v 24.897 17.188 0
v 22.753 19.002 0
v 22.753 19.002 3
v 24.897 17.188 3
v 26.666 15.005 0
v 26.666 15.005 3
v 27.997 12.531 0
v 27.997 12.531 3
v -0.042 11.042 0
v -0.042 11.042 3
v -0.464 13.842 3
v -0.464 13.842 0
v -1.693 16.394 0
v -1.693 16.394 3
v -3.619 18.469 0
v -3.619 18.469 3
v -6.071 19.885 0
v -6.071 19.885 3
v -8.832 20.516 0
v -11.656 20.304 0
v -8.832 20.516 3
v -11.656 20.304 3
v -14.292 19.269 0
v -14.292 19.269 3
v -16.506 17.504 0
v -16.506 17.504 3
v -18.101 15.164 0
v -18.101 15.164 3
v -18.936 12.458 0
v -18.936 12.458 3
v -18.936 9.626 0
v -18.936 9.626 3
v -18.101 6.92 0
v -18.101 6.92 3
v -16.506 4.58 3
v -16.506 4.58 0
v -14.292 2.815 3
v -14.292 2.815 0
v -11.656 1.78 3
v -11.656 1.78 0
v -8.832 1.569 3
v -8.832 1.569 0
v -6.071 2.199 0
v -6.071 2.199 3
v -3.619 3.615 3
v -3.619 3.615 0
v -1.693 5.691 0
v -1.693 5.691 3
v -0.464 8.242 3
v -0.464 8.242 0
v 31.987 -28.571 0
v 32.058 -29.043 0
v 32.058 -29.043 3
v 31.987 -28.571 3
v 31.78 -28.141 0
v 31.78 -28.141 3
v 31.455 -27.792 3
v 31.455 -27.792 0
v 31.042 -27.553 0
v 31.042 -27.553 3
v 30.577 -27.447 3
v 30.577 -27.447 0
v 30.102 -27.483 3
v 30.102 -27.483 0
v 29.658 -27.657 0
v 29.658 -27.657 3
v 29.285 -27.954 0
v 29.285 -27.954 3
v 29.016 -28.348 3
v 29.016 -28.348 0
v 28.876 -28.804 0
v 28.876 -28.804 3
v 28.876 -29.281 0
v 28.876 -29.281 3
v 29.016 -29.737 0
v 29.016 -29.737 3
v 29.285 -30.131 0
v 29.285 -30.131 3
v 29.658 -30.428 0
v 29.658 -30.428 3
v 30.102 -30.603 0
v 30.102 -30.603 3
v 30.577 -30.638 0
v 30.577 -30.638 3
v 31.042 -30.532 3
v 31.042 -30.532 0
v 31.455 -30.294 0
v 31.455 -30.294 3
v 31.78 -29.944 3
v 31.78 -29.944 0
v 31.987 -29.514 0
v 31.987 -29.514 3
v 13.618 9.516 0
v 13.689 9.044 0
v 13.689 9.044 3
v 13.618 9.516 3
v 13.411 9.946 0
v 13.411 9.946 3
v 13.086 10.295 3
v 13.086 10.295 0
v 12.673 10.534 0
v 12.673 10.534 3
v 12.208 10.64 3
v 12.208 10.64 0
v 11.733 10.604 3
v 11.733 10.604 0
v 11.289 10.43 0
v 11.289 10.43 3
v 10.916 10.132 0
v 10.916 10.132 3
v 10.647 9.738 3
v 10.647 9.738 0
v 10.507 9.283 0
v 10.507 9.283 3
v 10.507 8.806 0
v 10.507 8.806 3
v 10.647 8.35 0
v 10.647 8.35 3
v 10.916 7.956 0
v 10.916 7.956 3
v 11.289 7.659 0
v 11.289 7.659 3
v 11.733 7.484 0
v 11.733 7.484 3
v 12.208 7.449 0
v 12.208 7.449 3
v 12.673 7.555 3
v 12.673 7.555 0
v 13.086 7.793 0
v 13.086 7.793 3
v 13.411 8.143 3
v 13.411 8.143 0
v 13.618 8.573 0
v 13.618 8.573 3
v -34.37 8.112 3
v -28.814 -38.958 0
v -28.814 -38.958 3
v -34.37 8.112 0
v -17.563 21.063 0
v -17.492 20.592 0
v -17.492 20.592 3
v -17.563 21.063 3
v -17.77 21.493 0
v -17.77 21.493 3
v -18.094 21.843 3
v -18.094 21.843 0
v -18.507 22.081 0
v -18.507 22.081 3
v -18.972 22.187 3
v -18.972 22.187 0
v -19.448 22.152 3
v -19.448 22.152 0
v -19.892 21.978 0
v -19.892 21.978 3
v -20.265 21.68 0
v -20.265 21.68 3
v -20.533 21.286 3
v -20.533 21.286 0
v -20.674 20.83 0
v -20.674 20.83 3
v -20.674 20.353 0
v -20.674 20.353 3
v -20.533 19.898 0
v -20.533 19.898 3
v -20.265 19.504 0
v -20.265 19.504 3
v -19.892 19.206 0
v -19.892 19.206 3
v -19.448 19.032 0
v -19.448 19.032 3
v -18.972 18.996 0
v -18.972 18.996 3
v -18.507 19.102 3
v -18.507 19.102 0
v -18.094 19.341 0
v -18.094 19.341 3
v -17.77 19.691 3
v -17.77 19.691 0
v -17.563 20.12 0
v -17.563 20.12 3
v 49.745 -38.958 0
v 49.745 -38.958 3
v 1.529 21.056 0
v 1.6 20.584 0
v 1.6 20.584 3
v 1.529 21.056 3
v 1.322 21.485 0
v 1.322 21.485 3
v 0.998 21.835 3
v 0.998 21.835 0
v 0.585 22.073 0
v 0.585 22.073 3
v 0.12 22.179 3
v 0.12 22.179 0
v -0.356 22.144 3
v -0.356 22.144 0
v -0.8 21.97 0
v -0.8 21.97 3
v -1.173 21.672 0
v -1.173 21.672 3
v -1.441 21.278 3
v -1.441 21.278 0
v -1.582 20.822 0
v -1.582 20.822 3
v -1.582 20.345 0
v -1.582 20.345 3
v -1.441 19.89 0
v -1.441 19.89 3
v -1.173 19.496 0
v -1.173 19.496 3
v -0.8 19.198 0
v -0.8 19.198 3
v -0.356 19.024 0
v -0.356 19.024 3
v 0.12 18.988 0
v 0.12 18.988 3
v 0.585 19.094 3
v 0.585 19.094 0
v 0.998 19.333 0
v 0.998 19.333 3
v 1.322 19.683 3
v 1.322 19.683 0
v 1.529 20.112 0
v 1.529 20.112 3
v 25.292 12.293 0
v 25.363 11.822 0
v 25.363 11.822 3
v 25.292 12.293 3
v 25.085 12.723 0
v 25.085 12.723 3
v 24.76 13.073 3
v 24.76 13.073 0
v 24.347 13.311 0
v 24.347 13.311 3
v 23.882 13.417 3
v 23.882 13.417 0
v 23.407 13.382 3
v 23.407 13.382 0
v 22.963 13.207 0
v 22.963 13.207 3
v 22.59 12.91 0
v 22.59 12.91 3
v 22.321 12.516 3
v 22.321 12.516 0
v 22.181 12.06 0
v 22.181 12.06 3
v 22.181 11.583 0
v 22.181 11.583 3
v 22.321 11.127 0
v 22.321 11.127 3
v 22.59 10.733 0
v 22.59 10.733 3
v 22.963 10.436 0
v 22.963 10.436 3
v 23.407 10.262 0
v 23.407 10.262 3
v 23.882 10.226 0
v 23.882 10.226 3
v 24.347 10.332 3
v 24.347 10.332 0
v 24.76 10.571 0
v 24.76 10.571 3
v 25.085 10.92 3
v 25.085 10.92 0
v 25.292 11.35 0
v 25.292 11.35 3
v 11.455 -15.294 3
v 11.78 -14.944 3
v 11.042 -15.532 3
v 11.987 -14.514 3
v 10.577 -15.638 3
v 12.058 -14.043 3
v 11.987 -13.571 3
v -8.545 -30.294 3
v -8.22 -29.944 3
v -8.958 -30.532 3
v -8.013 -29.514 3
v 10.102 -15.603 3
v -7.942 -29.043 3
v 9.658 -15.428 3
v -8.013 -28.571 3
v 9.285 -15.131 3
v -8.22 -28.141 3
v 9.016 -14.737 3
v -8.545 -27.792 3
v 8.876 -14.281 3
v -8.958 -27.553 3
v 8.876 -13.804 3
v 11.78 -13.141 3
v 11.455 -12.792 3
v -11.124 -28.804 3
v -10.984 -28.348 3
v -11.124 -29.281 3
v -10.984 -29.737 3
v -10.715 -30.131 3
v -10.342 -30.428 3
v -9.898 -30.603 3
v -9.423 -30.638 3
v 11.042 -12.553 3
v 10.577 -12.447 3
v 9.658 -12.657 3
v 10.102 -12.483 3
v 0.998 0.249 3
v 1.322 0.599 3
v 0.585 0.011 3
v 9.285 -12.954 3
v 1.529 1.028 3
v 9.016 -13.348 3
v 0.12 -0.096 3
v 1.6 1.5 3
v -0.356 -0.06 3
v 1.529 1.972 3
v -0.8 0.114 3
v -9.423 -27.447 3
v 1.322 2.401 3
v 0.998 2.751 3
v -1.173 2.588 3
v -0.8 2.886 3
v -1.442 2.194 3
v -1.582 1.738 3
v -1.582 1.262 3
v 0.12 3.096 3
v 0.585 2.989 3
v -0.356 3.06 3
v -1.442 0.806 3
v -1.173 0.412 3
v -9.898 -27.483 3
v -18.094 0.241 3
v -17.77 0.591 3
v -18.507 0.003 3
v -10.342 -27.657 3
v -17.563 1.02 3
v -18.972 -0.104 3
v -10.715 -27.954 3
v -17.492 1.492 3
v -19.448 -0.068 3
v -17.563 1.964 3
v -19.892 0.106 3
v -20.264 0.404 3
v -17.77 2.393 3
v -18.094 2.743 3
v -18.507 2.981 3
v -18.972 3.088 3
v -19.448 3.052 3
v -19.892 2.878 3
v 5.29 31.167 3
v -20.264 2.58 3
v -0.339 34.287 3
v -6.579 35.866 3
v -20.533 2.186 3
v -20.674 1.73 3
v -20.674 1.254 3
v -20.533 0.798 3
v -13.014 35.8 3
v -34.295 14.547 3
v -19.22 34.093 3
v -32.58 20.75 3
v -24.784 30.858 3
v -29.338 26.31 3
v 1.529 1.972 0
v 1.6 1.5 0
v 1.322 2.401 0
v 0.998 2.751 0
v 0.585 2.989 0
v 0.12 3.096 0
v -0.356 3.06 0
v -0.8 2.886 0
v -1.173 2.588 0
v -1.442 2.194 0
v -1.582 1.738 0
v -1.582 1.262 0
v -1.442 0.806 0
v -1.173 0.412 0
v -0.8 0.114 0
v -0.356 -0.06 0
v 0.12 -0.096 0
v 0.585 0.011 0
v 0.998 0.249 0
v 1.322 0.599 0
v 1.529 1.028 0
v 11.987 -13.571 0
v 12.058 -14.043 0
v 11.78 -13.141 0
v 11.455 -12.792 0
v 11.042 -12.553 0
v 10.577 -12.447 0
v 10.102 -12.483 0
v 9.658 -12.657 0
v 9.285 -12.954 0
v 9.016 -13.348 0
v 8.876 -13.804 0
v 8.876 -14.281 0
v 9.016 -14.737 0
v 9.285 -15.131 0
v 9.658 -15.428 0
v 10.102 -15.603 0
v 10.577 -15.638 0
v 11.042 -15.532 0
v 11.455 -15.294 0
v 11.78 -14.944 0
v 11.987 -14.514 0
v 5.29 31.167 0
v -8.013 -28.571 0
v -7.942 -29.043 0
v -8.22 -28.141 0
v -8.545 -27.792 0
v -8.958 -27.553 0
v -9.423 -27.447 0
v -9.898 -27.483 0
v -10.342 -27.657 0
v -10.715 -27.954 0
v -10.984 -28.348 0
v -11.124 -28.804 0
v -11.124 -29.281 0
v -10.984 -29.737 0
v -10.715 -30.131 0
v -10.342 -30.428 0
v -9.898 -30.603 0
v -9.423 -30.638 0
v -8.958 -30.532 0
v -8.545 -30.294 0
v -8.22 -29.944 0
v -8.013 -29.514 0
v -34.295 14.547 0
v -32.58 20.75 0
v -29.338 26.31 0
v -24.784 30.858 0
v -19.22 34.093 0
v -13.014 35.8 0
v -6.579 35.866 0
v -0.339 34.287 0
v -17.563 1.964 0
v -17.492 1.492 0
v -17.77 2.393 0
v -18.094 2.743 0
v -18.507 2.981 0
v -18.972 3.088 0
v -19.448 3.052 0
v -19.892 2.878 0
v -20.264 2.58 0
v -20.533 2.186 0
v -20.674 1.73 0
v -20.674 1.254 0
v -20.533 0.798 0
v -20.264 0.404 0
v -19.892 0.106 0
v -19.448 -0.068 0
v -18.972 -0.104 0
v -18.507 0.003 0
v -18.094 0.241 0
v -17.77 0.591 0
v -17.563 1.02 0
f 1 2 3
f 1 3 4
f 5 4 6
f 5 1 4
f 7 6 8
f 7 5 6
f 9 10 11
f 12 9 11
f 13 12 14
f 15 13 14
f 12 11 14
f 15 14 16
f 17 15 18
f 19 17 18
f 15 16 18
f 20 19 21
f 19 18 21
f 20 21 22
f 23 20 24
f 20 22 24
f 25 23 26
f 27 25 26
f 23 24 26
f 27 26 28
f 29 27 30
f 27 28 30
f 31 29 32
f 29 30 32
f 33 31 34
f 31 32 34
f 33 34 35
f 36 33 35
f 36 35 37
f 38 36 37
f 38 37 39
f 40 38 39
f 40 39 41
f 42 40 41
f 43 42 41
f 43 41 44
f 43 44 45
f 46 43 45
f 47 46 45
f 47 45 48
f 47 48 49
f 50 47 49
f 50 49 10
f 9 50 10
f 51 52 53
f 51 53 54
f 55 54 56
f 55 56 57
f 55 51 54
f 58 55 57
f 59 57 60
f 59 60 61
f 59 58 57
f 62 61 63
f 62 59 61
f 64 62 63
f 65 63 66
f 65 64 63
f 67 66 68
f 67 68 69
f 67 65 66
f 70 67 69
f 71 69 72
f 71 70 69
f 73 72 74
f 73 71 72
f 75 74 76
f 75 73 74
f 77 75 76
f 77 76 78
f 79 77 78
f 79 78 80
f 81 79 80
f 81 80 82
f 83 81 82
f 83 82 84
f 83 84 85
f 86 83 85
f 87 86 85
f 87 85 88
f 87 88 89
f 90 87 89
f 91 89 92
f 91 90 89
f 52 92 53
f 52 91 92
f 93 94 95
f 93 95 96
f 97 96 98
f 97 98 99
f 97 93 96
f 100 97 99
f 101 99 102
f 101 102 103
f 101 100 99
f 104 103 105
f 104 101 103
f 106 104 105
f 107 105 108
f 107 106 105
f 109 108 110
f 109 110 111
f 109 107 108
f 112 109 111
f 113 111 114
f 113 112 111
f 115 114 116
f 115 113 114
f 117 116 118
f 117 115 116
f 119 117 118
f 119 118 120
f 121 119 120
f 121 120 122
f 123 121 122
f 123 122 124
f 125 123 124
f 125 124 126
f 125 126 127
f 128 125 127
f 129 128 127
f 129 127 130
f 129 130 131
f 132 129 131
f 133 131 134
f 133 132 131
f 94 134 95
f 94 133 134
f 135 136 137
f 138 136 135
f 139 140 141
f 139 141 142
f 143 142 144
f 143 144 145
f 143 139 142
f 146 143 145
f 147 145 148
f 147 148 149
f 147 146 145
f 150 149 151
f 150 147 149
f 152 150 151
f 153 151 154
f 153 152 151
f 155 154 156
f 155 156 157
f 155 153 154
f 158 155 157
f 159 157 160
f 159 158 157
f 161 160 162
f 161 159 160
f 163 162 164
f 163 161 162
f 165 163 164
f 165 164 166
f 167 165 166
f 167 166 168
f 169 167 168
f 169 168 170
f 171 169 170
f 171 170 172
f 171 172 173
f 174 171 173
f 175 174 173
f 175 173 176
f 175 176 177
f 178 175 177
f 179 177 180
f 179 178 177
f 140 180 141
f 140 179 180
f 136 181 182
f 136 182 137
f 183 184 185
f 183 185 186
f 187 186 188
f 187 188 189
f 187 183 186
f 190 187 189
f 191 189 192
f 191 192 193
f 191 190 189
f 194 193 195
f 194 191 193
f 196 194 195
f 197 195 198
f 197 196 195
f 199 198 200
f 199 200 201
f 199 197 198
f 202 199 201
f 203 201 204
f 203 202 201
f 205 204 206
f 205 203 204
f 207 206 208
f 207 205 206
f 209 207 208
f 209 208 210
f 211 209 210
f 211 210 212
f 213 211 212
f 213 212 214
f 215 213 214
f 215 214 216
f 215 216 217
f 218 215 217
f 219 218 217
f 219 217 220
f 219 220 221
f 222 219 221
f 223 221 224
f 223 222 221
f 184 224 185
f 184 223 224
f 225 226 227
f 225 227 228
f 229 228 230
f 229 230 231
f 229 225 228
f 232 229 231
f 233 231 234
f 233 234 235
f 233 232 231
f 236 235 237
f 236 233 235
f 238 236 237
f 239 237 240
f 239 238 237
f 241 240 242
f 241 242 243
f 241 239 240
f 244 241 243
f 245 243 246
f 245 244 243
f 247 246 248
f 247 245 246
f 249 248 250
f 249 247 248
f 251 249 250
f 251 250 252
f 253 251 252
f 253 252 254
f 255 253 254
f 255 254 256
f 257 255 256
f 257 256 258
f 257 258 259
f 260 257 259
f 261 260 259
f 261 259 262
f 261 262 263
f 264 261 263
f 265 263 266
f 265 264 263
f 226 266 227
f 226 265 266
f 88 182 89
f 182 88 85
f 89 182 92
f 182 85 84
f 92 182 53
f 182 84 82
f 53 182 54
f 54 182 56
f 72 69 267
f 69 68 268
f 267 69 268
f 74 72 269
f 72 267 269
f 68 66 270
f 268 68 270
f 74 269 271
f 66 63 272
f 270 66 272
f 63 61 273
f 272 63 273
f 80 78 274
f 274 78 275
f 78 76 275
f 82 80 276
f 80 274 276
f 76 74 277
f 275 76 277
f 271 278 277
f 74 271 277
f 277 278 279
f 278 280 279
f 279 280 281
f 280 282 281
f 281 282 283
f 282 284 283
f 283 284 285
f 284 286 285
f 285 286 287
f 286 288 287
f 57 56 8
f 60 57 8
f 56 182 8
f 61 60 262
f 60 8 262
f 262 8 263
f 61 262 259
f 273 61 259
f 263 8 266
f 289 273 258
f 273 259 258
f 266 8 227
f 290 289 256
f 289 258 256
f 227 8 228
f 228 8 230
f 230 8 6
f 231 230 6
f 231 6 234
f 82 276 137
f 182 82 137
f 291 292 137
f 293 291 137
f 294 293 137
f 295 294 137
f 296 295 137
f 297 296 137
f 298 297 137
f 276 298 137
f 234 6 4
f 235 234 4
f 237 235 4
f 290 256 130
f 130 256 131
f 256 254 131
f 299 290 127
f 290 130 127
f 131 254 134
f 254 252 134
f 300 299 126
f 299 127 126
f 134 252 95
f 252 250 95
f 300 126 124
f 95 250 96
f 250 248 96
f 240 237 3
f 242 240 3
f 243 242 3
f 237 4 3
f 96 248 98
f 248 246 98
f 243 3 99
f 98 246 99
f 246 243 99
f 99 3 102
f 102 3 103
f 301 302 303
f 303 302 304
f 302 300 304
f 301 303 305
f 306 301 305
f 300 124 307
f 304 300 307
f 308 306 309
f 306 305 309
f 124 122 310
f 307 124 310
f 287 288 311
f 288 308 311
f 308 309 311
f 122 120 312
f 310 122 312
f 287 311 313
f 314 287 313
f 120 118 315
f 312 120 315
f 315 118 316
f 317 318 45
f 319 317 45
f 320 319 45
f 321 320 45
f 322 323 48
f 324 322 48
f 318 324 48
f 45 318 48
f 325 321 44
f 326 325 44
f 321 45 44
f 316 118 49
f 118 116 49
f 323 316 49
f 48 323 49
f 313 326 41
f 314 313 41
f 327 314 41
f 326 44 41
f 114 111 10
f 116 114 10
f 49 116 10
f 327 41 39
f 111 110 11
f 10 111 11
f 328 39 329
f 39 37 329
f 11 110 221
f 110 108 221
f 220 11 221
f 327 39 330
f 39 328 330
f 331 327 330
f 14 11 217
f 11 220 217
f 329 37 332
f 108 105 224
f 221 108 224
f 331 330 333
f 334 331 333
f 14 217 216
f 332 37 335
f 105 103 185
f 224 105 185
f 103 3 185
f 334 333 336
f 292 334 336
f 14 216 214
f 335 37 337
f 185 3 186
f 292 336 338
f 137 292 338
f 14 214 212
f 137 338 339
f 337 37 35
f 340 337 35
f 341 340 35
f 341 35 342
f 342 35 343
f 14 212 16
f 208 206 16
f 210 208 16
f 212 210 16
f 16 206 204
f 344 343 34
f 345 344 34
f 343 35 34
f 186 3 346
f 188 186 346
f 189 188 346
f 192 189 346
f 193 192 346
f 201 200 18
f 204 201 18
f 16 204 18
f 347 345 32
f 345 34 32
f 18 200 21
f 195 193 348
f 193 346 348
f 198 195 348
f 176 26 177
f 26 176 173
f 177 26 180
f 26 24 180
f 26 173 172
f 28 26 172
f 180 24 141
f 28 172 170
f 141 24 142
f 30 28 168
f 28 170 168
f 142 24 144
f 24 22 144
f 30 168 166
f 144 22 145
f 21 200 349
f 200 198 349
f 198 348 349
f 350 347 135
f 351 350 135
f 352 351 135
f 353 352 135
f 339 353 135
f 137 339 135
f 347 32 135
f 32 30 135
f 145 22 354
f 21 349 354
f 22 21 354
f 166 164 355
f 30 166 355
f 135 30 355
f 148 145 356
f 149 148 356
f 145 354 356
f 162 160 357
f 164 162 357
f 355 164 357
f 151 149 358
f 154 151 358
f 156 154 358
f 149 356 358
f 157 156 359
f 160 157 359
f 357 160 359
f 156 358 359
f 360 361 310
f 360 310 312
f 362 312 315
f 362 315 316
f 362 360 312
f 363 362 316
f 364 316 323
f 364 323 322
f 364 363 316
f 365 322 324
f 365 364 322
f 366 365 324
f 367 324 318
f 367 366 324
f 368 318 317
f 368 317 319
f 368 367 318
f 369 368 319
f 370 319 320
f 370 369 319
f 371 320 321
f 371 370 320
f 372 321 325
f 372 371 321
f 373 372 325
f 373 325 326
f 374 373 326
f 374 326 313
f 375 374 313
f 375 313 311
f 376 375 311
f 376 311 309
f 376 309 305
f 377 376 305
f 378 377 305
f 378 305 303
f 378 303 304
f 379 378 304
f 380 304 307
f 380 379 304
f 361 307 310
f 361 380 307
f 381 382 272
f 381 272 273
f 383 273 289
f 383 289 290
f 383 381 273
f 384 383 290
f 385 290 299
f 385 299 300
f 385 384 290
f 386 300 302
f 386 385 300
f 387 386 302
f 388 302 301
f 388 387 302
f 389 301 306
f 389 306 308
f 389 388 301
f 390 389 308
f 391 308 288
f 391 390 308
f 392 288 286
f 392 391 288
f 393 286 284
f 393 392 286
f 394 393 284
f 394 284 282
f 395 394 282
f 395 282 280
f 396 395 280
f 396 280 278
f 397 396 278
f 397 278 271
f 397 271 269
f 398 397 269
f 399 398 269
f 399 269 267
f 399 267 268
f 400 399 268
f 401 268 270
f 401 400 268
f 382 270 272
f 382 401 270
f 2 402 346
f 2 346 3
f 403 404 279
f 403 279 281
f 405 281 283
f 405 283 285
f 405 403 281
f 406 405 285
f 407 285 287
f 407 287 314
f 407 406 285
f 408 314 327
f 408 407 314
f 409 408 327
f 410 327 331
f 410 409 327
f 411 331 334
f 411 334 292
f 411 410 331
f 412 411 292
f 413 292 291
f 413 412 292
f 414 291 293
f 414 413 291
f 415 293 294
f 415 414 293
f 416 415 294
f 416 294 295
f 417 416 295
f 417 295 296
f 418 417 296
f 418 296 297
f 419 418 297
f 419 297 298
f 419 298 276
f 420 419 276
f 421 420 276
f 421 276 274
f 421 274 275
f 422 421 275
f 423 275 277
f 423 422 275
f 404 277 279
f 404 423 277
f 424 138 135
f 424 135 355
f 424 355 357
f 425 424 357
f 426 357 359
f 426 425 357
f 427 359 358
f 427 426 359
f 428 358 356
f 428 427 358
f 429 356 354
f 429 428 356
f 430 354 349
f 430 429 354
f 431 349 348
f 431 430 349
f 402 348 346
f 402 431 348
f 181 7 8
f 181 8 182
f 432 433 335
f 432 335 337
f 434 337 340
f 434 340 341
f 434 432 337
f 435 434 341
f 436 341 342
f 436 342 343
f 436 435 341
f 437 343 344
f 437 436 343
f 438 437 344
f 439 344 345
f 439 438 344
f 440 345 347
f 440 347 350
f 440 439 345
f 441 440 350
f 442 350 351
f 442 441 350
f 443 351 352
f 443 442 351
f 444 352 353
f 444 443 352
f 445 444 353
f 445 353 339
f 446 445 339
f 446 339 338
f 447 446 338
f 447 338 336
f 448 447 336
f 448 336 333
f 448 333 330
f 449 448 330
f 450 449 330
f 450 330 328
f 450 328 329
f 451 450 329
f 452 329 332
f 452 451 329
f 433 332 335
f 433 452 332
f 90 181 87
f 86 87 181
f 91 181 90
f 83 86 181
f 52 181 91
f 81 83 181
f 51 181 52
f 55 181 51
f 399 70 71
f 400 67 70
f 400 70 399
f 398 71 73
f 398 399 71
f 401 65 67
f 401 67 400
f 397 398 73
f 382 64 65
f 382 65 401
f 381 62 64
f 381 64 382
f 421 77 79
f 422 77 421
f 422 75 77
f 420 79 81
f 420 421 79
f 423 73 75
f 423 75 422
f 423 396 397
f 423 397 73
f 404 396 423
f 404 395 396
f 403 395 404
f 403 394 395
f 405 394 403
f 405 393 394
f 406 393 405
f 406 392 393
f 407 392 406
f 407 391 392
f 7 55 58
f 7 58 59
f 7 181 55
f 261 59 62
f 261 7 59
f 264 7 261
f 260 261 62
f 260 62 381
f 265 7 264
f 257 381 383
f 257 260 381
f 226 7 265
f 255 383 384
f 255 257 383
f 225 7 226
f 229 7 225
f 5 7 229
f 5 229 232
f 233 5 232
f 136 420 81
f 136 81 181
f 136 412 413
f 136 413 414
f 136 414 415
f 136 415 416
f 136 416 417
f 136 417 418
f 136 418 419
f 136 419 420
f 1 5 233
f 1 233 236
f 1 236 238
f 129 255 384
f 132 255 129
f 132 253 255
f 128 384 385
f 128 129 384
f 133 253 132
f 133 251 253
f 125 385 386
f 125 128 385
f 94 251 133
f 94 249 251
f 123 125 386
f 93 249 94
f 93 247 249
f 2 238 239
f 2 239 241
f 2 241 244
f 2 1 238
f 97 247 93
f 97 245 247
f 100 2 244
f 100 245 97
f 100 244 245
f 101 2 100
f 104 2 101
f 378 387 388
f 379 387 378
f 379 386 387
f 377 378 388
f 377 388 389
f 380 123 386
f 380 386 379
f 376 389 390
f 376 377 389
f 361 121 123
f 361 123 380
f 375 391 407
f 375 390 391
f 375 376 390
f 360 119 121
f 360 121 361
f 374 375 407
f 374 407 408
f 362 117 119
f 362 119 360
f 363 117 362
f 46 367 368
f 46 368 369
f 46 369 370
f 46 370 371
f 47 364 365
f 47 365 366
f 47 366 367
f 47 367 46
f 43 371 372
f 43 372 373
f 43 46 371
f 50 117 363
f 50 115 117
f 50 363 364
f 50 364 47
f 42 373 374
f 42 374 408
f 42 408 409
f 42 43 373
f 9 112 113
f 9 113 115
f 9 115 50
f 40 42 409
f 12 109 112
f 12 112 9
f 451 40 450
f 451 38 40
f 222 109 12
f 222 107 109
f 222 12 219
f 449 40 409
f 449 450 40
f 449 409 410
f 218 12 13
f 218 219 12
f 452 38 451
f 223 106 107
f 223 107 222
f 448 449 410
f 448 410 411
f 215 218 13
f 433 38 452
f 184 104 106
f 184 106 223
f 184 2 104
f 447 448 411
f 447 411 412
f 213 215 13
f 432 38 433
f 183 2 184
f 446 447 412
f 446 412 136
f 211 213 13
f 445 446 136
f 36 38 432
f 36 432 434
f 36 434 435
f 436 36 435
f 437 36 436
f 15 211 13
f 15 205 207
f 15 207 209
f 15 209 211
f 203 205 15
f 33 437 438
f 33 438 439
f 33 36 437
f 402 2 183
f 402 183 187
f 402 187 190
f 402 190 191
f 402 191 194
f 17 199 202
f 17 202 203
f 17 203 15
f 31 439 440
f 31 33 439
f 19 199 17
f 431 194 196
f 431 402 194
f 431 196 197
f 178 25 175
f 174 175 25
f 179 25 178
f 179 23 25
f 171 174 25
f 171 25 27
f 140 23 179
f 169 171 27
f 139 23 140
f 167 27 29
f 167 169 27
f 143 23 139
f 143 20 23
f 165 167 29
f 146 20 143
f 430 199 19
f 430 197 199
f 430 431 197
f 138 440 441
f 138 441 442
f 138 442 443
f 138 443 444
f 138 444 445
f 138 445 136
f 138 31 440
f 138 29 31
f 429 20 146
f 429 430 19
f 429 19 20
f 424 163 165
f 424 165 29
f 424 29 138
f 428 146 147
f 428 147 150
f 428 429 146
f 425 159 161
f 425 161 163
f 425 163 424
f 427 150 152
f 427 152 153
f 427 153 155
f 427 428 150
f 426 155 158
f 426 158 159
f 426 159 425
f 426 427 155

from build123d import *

# Parameters (mm, degrees)
SKETCH_1_R          = 1.6
SKETCH_1_R_2        = 8
EXTRUDE_1_DEPTH     = 3
SKETCH_2_R          = 9.5
CUT_EXTRUDE_1_DEPTH = 10


with BuildPart() as part:
    # 草图1 → 凸台-拉伸1 (new body)
    with BuildSketch(Plane.XY):
        with BuildLine():
            Line((27.996813697, 12.530864127), (49.744946635, -38.957900319))
            Line((49.744946635, -38.957900319), (-28.813781546, -38.957900319))
            Line((-28.813781546, -38.957900319), (-34.369737997, 8.111506623))
            ThreePointArc((-34.369737997, 8.111506623), (-22.106553261, 32.655394345), (5.290025786, 31.166911584))
            Line((5.290025786, 31.166911584), (22.752678609, 19.002490435))
            ThreePointArc((22.752678609, 19.002490435), (25.832973998, 16.137991786), (27.996813697, 12.530864127))
        make_face()
        with Locations((-19.091881546, 20.591881546)):
            Circle(SKETCH_1_R, mode=Mode.SUBTRACT)
        with Locations((-19.09157413, 1.492010657)):
            Circle(SKETCH_1_R, mode=Mode.SUBTRACT)
        with Locations((0, 1.5)):
            Circle(SKETCH_1_R, mode=Mode.SUBTRACT)
        with Locations((0.000307159, 20.583891946)):
            Circle(SKETCH_1_R, mode=Mode.SUBTRACT)
        with Locations((-9.542099681, 11.042099681)):
            Circle(SKETCH_1_R_2, mode=Mode.SUBTRACT)
        with Locations((10.457900319, -14.042678355)):
            Circle(SKETCH_1_R, mode=Mode.SUBTRACT)
        with Locations((30.457900319, -29.042678355)):
            Circle(SKETCH_1_R, mode=Mode.SUBTRACT)
        with Locations((-9.542099681, -29.042678355)):
            Circle(SKETCH_1_R, mode=Mode.SUBTRACT)
        with Locations((23.762798875, 11.821649257)):
            Circle(SKETCH_1_R, mode=Mode.SUBTRACT)
        with Locations((12.088647332, 9.044206953)):
            Circle(SKETCH_1_R, mode=Mode.SUBTRACT)
    extrude(amount=EXTRUDE_1_DEPTH)

    # 草图2 → 切除-拉伸1 (cut)
    with BuildSketch(Plane.XY.offset(3)):
        with Locations((-9.542099681, 11.042099681)):
            Circle(SKETCH_2_R)
    extrude(amount=-CUT_EXTRUDE_1_DEPTH, mode=Mode.SUBTRACT)


solid = part.part
